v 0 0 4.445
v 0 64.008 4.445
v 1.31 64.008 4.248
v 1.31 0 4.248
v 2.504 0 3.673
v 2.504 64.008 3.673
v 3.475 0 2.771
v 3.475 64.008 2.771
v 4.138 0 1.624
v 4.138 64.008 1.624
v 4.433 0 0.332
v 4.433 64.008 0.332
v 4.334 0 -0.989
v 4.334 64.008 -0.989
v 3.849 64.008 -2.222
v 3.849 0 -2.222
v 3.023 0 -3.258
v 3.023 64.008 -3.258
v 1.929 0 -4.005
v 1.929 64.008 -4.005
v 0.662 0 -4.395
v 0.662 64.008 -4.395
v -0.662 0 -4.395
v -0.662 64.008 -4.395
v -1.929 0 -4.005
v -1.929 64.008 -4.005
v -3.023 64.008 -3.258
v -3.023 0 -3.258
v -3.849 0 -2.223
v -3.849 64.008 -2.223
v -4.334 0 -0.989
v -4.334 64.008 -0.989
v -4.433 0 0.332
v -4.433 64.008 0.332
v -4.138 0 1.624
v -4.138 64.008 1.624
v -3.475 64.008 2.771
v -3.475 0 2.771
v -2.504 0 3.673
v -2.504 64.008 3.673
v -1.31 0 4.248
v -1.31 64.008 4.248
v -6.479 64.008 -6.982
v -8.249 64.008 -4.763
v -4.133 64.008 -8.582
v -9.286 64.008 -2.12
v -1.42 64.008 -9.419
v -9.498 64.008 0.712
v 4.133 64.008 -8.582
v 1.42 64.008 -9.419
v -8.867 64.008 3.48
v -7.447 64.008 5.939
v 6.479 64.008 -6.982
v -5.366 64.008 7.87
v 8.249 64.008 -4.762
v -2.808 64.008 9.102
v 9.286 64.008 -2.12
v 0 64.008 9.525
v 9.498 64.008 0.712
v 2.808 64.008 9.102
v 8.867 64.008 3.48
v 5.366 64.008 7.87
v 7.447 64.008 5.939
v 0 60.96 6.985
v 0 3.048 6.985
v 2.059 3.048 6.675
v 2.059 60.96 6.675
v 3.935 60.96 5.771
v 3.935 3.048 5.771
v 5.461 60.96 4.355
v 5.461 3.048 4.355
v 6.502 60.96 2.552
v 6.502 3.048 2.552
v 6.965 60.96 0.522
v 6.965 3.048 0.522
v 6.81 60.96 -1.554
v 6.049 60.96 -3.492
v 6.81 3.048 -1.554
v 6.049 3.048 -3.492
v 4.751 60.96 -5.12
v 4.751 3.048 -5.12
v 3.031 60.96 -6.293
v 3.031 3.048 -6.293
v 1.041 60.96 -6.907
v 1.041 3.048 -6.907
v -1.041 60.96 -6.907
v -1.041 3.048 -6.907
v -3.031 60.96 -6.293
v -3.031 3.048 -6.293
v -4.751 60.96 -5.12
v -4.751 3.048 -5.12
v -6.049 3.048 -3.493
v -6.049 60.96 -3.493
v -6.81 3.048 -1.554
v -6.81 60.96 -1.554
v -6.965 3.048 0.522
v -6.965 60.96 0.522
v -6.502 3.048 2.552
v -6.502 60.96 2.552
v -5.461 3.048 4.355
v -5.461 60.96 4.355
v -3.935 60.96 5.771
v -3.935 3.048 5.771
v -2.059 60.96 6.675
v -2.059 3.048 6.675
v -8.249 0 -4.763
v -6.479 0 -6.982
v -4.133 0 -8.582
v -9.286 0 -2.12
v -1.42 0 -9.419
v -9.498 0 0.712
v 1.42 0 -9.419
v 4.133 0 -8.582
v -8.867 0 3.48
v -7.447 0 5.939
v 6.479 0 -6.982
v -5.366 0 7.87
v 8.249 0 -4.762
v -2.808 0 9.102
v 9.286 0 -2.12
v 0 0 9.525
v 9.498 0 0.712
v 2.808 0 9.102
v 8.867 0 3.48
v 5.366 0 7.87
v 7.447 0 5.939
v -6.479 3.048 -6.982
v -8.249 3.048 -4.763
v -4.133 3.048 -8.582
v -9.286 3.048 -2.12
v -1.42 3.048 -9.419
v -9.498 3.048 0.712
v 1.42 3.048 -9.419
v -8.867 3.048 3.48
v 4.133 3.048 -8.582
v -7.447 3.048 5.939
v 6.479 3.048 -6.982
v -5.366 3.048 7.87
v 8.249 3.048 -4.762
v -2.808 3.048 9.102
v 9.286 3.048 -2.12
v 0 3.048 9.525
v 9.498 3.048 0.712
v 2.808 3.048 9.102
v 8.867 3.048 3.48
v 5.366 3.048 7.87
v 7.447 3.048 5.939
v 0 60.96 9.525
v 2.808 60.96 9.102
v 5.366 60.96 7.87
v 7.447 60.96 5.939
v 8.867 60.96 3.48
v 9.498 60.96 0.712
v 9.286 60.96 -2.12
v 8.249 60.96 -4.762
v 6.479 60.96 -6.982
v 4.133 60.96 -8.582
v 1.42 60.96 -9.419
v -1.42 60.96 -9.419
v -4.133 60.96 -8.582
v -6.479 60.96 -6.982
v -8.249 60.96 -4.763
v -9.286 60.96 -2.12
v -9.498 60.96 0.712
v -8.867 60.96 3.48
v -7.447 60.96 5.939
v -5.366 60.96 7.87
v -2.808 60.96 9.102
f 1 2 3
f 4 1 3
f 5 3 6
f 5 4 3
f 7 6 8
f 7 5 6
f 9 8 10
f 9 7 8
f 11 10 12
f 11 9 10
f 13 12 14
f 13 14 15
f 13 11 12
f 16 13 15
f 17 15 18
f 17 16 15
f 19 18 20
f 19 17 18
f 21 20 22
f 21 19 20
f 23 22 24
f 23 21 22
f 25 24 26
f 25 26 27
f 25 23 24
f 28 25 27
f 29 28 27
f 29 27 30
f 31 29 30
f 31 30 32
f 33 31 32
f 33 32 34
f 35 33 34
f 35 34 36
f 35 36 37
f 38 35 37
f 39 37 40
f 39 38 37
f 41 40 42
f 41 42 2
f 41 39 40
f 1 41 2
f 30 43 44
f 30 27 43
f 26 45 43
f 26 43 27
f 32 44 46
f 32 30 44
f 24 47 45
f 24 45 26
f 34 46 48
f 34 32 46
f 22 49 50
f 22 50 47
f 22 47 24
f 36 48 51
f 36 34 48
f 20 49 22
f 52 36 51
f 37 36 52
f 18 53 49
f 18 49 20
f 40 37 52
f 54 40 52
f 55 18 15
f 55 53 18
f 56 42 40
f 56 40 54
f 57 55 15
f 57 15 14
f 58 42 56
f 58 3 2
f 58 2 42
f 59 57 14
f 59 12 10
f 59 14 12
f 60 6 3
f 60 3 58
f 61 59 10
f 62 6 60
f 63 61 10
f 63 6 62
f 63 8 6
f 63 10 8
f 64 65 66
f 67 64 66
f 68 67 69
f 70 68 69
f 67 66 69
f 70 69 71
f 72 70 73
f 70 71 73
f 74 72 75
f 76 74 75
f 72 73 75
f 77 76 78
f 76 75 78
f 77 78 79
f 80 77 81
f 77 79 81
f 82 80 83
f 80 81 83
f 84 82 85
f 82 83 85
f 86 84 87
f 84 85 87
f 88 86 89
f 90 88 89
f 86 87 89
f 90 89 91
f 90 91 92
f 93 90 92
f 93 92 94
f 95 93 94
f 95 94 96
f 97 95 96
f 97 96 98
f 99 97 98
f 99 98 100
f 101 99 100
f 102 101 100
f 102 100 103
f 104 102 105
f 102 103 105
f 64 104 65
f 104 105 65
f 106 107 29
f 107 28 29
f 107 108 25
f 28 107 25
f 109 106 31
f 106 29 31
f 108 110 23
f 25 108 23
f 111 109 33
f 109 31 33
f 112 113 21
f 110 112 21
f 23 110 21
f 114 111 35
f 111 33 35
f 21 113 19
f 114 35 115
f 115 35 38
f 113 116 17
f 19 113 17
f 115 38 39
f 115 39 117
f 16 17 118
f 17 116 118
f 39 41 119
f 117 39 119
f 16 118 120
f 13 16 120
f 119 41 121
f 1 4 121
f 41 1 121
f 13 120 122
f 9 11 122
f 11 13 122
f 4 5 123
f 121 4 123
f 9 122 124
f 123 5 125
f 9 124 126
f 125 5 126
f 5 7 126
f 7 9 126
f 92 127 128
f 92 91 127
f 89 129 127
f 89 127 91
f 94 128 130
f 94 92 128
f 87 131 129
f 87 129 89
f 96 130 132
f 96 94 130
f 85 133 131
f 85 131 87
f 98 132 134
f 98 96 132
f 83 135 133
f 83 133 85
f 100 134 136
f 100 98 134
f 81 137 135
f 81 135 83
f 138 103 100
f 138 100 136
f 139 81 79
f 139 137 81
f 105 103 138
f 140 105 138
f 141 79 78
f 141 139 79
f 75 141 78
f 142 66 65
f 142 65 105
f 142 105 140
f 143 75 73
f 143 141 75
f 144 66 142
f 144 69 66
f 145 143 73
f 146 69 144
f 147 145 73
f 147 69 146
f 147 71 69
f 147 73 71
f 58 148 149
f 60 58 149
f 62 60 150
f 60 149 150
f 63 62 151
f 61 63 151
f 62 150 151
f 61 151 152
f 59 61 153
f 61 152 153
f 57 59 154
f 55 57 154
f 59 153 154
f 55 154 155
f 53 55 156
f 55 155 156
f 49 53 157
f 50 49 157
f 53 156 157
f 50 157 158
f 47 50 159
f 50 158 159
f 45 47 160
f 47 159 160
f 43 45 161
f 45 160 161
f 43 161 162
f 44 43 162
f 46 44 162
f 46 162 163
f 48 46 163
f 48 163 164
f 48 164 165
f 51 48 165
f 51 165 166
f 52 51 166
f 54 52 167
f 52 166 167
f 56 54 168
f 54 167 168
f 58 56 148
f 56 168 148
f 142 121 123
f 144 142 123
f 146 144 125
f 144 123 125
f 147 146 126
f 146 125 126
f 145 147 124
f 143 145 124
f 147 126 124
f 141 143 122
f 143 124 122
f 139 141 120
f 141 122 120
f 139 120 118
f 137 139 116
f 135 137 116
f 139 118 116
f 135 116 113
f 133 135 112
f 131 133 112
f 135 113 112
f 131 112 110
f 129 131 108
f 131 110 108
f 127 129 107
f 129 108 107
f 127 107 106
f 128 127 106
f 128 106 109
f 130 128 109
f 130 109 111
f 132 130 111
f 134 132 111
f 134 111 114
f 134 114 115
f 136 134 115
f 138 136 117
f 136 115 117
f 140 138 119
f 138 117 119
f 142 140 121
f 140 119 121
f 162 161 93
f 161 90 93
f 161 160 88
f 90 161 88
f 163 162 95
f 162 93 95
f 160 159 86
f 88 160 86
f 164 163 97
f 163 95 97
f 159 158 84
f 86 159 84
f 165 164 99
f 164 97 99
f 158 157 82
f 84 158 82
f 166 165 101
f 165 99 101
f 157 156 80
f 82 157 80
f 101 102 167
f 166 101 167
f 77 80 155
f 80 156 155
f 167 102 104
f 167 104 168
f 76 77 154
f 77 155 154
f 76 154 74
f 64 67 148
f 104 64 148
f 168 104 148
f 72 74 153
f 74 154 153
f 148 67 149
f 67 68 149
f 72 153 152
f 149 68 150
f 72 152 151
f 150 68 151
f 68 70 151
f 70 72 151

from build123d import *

# Parameters (mm, degrees)
SKETCH1_R           = 9.525
SKETCH1_R_2         = 4.445
BOSS_EXTRUDE1_DEPTH = 3.048
SKETCH2_R           = 6.985
SKETCH2_R_2         = 4.445
BOSS_EXTRUDE2_DEPTH = 57.912
SKETCH3_R           = 9.525
SKETCH3_R_2         = 6.985
SKETCH3_R_3         = 4.445
BOSS_EXTRUDE3_DEPTH = 3.048


with BuildPart() as part:
    # Sketch1 → Boss-Extrude1 (new body)
    with BuildSketch(Plane(origin=(0, 0, 0), x_dir=(1, 0, 0), z_dir=(0, 1, 0))):
        with Locations(Location((0, 0, 0), (0, 0, 270))):  # turned: the seam where the file's is
            Circle(SKETCH1_R)
        with Locations(Location((0, 0, 0), (0, 0, 270))):  # turned: the seam where the file's is
            Circle(SKETCH1_R_2, mode=Mode.SUBTRACT)
    extrude(amount=BOSS_EXTRUDE1_DEPTH)

    # Sketch2 → Boss-Extrude2 (add)
    with BuildSketch(Plane(origin=(0, 3.048, 0), x_dir=(1, 0, 0), z_dir=(0, 1, 0))):
        with Locations(Location((0, 0, 0), (0, 0, 270))):  # turned: the seam where the file's is
            Circle(SKETCH2_R)
        with Locations(Location((0, 0, 0), (0, 0, 270))):  # turned: the seam where the file's is
            Circle(SKETCH2_R_2, mode=Mode.SUBTRACT)
    extrude(amount=BOSS_EXTRUDE2_DEPTH)

    # Sketch3 → Boss-Extrude3 (add)
    with BuildSketch(Plane(origin=(0, 60.96, 0), x_dir=(1, 0, 0), z_dir=(0, 1, 0))):
        with Locations(Location((0, 0, 0), (0, 0, 270))):  # turned: the seam where the file's is
            Circle(SKETCH3_R)
        with Locations(Location((0, 0, 0), (0, 0, 270))):  # turned: the seam where the file's is
            Circle(SKETCH3_R_2, mode=Mode.SUBTRACT)
        with Locations(Location((0, 0, 0), (0, 0, 270))):  # turned: the seam where the file's is
            Circle(SKETCH3_R_2)
        with Locations(Location((0, 0, 0), (0, 0, 270))):  # turned: the seam where the file's is
            Circle(SKETCH3_R_3, mode=Mode.SUBTRACT)
    extrude(amount=BOSS_EXTRUDE3_DEPTH)


solid = part.part
